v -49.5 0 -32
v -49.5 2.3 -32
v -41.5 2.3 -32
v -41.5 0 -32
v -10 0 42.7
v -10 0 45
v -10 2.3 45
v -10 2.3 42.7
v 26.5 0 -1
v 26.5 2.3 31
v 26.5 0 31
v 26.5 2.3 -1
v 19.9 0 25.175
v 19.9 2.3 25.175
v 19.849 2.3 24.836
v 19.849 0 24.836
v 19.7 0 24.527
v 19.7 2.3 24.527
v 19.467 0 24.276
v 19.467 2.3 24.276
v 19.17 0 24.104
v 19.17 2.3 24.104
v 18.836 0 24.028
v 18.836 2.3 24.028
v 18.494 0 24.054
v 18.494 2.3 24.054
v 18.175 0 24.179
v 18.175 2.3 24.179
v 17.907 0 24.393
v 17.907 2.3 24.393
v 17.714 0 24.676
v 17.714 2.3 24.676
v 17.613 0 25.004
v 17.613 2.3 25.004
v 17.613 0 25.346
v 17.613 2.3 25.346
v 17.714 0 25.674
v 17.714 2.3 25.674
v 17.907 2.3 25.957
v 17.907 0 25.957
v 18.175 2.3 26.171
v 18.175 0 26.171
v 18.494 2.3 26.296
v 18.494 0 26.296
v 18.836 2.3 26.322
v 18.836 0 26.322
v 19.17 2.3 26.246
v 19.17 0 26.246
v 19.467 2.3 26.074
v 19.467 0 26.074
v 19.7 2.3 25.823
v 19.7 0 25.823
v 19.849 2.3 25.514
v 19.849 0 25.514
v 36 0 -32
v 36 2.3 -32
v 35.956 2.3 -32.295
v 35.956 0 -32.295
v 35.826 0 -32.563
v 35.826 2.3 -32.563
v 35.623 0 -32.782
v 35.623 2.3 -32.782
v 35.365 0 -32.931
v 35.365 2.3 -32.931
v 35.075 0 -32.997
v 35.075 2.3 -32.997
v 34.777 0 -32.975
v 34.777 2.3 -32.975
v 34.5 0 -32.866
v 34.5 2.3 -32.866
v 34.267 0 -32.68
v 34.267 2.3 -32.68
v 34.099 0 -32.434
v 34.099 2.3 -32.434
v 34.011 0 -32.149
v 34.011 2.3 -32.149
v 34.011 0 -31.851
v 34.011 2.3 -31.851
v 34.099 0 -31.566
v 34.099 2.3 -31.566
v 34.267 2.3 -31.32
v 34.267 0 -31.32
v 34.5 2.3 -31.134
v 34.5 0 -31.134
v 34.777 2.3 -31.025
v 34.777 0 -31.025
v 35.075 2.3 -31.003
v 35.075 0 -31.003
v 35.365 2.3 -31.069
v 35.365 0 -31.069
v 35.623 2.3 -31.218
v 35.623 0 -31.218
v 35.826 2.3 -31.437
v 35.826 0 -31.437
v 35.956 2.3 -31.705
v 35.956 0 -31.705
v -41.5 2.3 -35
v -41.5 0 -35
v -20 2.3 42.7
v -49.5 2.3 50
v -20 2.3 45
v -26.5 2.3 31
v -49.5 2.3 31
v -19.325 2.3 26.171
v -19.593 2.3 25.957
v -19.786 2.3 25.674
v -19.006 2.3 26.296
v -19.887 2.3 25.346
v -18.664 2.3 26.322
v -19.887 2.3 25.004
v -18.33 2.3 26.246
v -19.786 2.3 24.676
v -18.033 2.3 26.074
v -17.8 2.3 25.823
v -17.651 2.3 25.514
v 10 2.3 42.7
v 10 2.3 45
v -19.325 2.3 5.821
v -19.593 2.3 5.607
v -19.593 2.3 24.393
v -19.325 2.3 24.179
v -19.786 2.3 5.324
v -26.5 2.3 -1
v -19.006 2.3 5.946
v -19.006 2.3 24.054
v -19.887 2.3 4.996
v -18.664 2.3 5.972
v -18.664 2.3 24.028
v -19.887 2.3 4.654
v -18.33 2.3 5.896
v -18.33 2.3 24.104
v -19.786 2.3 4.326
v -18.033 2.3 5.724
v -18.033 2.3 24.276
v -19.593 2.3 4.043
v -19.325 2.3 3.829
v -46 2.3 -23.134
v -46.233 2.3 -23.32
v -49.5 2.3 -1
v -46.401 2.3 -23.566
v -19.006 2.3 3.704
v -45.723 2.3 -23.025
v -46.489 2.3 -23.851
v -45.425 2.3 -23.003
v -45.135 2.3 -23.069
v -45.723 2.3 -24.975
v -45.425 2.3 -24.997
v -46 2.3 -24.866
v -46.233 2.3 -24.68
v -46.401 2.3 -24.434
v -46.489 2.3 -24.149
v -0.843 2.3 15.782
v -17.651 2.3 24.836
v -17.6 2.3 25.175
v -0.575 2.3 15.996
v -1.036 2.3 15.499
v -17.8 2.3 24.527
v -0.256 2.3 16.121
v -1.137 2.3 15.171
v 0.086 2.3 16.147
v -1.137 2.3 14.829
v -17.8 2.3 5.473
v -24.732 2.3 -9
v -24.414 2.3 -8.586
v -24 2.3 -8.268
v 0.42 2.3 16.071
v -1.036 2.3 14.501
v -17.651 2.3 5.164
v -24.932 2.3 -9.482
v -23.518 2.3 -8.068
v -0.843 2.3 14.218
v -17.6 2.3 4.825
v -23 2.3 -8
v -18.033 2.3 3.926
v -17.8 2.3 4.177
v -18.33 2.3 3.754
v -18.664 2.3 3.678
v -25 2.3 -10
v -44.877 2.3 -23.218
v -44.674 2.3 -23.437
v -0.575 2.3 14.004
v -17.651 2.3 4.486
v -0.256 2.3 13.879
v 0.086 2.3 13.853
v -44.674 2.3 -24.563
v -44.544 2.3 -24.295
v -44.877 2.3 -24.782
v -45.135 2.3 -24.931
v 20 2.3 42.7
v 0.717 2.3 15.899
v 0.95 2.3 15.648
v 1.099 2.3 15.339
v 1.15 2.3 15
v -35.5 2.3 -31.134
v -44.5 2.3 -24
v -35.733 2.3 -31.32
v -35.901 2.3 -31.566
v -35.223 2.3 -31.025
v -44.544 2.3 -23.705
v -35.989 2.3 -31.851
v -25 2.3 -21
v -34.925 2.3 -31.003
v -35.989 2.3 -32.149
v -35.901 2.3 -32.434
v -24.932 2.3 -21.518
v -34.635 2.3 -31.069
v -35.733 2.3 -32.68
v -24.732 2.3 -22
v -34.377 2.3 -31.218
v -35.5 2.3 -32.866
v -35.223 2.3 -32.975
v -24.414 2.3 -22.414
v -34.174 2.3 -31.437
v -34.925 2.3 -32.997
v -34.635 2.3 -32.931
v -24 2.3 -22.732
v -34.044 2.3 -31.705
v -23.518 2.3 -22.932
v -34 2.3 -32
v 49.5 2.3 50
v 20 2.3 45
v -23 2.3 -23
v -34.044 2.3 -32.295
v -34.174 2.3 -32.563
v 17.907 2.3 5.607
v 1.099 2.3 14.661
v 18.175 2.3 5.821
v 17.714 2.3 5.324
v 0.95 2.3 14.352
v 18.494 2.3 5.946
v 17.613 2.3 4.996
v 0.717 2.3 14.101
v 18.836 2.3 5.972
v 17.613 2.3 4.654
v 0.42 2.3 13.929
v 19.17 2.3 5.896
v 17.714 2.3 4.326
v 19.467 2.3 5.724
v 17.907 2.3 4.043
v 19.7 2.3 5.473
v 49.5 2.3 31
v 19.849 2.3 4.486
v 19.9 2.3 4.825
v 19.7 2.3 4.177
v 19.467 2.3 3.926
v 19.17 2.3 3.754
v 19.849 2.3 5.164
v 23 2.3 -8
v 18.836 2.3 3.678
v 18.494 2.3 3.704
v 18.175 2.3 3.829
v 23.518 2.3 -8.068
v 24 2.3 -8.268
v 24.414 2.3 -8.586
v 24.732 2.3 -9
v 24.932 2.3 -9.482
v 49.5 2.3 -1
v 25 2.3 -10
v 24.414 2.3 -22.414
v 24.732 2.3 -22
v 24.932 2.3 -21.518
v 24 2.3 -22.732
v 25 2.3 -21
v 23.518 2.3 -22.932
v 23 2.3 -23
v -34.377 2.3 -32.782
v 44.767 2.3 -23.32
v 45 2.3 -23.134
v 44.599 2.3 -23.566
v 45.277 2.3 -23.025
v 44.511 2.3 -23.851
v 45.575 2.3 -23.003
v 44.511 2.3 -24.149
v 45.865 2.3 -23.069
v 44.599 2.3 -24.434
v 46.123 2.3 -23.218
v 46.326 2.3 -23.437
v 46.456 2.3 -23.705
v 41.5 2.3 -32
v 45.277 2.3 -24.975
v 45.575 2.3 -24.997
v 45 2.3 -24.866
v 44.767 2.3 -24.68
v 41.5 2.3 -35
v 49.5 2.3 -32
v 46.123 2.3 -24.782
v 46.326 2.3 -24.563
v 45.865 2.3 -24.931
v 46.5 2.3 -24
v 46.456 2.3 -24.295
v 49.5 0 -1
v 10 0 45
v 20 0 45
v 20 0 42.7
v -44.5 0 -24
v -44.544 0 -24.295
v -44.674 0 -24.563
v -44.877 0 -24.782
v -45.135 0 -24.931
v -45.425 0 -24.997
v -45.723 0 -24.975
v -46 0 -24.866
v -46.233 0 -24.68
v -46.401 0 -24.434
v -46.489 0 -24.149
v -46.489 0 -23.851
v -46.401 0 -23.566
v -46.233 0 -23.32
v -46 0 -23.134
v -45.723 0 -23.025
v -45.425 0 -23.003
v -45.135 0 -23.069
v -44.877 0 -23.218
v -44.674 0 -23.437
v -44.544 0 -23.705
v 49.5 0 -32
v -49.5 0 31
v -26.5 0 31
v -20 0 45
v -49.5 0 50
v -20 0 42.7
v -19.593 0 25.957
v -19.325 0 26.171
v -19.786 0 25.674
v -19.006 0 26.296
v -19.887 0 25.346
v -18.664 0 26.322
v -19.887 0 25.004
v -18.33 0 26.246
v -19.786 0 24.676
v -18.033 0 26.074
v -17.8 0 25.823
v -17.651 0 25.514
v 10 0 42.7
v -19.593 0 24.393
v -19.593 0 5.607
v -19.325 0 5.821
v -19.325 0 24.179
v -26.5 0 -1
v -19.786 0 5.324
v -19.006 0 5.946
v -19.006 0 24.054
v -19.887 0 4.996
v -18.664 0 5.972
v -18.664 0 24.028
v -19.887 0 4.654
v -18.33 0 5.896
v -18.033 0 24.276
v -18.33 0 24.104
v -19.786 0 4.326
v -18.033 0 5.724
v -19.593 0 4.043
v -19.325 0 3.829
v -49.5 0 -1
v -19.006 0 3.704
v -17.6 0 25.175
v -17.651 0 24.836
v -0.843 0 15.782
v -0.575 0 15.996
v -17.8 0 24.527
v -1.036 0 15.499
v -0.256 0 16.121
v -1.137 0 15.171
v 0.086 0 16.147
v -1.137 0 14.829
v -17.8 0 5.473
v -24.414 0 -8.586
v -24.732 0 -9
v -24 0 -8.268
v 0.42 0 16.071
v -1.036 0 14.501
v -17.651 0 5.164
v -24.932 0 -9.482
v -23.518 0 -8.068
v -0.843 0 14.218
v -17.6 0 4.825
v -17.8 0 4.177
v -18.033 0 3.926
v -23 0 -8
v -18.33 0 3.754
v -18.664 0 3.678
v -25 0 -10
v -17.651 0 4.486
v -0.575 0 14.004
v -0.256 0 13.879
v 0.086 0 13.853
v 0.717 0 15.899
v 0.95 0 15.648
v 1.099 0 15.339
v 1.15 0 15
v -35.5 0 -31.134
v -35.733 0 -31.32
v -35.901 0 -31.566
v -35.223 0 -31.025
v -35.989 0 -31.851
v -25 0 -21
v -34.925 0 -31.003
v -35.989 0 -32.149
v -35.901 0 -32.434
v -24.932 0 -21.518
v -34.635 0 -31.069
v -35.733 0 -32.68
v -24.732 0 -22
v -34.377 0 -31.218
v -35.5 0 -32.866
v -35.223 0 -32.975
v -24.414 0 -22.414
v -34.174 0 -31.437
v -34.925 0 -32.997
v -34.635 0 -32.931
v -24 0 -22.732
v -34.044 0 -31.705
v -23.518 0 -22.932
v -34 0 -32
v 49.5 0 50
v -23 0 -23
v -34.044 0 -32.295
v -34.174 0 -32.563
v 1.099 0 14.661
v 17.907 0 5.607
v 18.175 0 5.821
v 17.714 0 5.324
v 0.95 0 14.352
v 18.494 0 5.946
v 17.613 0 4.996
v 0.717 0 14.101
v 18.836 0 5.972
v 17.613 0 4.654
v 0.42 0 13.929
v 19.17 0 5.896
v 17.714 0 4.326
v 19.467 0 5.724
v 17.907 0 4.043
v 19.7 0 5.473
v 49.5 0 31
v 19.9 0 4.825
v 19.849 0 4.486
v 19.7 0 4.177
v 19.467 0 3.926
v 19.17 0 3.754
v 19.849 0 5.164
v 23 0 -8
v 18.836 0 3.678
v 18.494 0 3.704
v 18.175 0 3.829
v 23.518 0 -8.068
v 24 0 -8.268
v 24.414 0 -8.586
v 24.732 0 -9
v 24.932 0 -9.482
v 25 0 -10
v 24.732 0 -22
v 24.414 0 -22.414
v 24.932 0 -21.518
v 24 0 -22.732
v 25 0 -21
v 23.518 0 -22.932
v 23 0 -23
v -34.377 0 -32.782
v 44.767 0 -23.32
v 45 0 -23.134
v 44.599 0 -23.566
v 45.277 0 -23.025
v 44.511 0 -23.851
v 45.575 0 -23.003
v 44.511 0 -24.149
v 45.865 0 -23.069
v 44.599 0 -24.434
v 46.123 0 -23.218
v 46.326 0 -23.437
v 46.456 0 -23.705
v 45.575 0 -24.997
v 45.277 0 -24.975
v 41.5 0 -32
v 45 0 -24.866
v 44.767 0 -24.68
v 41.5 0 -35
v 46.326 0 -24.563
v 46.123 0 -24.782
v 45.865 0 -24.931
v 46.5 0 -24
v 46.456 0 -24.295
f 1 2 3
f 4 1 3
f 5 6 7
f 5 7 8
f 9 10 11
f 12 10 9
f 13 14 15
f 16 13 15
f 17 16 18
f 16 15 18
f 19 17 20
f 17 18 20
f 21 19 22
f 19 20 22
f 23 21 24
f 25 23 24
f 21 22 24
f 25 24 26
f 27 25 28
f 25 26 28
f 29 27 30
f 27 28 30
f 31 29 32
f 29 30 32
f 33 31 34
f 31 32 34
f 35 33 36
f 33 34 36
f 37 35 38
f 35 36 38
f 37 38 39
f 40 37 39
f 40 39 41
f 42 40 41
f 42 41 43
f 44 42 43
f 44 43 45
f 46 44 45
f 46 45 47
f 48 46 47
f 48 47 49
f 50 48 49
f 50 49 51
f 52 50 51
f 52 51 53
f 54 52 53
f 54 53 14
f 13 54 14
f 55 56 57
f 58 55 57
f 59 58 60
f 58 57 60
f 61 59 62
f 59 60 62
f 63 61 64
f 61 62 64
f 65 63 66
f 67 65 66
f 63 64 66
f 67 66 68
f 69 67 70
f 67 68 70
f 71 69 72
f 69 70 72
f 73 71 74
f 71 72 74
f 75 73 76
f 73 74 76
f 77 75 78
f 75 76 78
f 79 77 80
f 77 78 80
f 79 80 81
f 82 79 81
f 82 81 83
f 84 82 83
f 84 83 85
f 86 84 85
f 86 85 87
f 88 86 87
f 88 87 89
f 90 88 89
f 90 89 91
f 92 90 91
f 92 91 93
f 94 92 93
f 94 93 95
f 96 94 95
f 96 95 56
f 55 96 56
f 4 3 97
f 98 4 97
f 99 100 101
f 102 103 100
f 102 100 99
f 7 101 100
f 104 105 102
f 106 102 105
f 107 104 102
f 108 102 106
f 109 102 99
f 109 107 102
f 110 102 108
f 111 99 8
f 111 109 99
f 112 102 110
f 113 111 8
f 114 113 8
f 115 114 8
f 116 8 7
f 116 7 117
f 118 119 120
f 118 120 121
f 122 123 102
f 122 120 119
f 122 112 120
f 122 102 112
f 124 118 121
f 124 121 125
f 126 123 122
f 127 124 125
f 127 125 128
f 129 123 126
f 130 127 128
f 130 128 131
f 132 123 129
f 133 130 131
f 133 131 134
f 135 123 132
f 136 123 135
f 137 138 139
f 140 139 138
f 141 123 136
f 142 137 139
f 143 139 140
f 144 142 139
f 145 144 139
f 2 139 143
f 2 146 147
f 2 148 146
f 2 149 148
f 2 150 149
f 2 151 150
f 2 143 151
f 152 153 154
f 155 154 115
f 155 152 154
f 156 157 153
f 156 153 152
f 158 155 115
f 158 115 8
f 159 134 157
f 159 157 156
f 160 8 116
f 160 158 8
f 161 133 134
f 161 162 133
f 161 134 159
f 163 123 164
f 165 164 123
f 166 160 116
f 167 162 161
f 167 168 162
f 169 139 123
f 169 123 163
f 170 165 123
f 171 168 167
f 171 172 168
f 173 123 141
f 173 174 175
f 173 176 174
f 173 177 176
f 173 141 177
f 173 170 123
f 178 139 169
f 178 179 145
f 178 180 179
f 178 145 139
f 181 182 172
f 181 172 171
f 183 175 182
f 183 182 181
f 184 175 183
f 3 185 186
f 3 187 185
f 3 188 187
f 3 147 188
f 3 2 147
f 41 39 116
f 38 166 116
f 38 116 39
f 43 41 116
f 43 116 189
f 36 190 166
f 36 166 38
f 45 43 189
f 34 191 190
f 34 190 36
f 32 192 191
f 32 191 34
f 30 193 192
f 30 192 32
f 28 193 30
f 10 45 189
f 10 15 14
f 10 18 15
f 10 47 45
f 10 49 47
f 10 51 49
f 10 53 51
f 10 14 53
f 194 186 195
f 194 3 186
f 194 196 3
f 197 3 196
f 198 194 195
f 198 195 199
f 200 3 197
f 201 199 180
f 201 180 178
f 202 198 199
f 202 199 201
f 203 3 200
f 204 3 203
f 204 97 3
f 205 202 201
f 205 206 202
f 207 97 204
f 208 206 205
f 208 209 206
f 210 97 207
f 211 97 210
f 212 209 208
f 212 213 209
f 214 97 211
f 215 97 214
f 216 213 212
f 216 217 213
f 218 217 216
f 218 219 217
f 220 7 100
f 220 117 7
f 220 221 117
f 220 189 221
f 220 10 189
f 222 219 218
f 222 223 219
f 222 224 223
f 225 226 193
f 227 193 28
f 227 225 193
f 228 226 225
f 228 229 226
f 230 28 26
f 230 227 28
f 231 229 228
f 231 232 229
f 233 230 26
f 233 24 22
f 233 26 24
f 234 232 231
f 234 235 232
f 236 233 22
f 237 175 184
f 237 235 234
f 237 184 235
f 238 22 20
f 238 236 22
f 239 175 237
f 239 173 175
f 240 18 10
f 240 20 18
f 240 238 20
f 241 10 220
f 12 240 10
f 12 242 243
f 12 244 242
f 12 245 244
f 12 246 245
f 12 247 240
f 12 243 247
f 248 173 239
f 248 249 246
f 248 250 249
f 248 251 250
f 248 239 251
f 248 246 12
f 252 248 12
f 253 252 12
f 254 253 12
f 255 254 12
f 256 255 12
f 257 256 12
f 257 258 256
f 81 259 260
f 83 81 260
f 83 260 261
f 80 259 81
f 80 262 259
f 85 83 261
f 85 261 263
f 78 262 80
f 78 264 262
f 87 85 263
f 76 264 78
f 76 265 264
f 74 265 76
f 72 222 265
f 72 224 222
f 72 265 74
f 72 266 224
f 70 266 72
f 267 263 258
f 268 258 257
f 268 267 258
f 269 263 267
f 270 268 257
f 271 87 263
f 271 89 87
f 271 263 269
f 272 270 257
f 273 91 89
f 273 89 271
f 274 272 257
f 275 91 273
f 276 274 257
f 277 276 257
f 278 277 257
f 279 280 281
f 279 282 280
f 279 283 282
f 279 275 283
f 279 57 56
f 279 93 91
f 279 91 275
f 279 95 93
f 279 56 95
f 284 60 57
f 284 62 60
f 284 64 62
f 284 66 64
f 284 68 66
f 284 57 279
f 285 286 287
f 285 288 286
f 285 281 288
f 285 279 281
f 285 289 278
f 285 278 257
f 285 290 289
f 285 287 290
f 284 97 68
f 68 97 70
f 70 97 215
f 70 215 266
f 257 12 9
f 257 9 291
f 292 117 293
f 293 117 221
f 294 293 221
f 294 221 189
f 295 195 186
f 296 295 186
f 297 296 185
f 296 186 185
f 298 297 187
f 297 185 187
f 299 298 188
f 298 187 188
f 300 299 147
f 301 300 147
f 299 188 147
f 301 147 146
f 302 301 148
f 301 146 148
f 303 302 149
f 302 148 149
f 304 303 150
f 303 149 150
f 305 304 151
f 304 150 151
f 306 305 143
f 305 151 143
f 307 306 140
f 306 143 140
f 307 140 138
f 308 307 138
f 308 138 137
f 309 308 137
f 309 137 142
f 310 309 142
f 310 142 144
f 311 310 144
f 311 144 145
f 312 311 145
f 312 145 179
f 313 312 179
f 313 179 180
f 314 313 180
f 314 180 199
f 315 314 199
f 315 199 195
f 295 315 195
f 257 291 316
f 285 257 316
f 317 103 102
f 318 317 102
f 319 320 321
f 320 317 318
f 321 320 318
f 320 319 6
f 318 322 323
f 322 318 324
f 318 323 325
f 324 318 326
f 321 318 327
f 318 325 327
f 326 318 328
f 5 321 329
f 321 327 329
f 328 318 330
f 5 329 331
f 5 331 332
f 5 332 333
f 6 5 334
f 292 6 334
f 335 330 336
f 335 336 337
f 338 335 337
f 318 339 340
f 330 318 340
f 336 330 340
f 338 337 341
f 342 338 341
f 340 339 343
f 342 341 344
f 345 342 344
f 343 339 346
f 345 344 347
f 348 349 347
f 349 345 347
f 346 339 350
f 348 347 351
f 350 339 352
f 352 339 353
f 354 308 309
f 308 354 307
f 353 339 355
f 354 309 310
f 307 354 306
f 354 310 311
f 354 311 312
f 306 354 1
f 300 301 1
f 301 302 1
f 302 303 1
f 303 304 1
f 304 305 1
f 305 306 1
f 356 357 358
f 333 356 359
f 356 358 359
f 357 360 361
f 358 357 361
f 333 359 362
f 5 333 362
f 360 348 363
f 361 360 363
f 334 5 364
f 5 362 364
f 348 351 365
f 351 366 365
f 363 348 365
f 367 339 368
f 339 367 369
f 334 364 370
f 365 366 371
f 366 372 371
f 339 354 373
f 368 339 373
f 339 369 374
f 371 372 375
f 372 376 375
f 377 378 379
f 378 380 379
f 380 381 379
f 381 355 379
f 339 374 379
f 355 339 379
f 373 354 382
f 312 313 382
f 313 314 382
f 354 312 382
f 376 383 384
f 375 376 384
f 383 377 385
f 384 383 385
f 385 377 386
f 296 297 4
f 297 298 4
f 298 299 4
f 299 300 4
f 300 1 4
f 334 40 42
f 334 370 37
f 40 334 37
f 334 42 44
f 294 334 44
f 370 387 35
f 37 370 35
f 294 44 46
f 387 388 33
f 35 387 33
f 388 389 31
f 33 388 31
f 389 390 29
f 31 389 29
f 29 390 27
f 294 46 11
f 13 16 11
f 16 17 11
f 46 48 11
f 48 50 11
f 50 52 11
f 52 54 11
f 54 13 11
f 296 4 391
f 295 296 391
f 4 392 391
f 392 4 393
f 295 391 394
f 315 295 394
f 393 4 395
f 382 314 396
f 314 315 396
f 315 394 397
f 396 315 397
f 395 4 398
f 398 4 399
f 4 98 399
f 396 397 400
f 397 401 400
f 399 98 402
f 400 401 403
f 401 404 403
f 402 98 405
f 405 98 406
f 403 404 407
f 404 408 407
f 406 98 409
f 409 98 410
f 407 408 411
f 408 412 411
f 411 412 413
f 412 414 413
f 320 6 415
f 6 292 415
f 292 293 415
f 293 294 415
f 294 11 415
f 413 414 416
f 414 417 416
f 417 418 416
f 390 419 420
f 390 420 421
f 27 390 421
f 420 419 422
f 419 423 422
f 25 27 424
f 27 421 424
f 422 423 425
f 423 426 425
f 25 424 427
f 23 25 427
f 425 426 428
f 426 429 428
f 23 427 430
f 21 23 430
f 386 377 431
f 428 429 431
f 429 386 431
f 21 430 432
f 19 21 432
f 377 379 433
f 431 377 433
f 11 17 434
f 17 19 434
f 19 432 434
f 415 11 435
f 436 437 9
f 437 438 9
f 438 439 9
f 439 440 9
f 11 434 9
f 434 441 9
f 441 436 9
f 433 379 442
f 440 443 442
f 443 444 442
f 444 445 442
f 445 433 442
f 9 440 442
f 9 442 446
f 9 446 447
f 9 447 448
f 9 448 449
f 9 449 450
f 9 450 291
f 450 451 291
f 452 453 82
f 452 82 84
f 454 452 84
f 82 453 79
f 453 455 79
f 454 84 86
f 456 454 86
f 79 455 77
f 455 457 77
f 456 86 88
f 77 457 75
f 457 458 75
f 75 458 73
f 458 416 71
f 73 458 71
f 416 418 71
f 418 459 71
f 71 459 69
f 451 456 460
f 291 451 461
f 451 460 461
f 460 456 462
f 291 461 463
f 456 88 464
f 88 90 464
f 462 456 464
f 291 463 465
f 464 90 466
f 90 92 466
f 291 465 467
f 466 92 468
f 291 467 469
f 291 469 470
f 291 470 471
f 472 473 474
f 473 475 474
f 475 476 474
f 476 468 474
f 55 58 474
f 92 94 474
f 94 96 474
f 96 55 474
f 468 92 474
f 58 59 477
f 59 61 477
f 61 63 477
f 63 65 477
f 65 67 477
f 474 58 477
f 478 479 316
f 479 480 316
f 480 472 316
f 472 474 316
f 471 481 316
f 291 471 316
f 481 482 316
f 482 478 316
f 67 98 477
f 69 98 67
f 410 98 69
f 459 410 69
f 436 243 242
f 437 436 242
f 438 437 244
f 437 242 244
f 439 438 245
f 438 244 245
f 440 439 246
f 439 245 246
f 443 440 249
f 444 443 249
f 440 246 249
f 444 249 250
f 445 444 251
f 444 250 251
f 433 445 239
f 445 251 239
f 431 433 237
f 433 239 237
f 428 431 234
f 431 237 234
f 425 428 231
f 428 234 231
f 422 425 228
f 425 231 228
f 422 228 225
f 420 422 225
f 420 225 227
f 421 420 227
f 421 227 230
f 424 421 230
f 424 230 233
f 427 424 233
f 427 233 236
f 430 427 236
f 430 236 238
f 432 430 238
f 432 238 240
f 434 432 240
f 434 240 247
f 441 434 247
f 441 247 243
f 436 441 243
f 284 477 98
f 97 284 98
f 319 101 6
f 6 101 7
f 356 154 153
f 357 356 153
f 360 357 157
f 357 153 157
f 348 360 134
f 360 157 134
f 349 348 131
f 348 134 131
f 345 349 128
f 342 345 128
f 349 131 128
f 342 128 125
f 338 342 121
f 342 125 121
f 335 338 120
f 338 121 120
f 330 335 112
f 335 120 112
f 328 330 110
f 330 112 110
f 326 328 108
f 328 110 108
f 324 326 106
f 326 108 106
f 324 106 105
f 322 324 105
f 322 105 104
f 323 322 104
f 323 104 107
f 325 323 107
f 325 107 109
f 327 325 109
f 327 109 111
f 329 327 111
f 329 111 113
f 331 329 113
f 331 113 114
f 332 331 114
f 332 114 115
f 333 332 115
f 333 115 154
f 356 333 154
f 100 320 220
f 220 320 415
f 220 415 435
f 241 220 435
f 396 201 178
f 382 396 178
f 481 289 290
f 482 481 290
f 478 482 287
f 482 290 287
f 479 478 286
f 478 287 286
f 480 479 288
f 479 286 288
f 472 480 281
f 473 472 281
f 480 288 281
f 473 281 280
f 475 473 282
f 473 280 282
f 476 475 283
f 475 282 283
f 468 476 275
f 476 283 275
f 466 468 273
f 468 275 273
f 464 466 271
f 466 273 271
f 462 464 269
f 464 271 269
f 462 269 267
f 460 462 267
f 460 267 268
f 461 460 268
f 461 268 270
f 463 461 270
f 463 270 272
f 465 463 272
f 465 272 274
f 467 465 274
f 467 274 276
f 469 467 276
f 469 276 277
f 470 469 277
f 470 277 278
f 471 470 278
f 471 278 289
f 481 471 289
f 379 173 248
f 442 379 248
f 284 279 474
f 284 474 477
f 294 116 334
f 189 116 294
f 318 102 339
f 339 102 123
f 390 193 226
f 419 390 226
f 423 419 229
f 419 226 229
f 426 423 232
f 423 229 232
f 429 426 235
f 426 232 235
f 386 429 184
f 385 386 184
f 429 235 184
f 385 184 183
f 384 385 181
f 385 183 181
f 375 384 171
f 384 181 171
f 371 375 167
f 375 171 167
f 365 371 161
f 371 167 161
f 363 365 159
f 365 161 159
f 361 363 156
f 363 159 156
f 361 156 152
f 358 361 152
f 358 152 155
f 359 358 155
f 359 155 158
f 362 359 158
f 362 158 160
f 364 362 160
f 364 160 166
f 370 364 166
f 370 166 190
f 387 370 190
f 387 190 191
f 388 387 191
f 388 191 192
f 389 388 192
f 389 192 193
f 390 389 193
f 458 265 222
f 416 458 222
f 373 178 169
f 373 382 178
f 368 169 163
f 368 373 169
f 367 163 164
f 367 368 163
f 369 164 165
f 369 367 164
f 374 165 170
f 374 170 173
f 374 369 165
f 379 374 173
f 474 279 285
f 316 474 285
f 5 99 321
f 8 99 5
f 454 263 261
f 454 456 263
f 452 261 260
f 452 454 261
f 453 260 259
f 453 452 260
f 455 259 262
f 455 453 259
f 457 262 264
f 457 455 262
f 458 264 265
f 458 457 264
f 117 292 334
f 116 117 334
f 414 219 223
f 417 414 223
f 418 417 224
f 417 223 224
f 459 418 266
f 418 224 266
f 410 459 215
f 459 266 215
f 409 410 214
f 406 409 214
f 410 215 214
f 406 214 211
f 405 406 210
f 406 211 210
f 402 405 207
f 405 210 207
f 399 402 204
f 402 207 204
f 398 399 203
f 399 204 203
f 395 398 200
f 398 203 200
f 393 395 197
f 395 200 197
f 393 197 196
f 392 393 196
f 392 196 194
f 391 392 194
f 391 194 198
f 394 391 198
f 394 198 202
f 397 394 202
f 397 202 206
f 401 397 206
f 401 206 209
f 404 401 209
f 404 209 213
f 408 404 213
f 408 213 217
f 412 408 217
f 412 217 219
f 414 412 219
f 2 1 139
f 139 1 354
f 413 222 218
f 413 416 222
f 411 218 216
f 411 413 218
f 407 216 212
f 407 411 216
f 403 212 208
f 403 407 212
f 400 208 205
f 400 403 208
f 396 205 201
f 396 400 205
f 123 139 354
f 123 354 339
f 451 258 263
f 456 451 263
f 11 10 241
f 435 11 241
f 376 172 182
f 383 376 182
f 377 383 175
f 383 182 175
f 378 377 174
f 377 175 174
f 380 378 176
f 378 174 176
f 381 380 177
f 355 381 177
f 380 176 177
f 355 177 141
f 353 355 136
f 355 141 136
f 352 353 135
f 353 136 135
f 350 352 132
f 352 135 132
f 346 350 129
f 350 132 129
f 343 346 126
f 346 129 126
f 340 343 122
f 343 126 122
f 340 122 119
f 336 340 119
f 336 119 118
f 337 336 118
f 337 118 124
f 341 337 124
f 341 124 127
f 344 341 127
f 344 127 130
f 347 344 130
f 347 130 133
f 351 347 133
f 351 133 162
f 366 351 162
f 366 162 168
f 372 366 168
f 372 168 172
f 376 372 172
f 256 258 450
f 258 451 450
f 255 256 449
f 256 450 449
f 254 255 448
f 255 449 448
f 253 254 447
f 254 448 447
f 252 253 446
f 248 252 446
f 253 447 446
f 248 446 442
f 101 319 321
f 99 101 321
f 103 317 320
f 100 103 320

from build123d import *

# Parameters (mm, degrees)
BOSS_EXTRUDE1_DEPTH = 2.3
SKETCH3_W           = 8
SKETCH3_H           = 3
SKETCH3_W_2         = 23
SKETCH3_H_2         = 32
CUT_EXTRUDE1_DEPTH  = 3.3
SKETCH4_R           = 1
CUT_EXTRUDE2_DEPTH  = 3.3
SKETCH6_R           = 1.15
CUT_EXTRUDE3_DEPTH  = 3.3
SKETCH8_R           = 1
CUT_EXTRUDE4_DEPTH  = 3.3
SKETCH9_W           = 10
SKETCH9_H           = 2.3
CUT_EXTRUDE5_DEPTH  = 2.3
CUT_EXTRUDE6_DEPTH  = 2.3
FILLET1_R           = 2


with BuildPart() as part:
    # Sketch2 → Boss-Extrude1 (new body)
    with BuildSketch(Plane(origin=(0, 0, 0), x_dir=(1, 0, 0), z_dir=(0, 1, 0))):
        Polygon((0, 35), (-49.5, 35), (-49.5, 0), (-49.5, -50), (0, -50), (49.5, -50), (49.5, 0), (49.5, 35), align=None)
    extrude(amount=BOSS_EXTRUDE1_DEPTH)

    # Sketch3 → Cut-Extrude1 (cut, through all)
    with BuildSketch(Plane(origin=(0, 2.3, 0), x_dir=(1, 0, 0), z_dir=(0, 1, 0))):
        with Locations((-45.5, 33.5)):
            Rectangle(SKETCH3_W, SKETCH3_H)
        with Locations((45.5, 33.5)):
            Rectangle(SKETCH3_W, SKETCH3_H)
        with Locations((38, -15)):
            Rectangle(SKETCH3_W_2, SKETCH3_H_2)
        with Locations((-38, -15)):
            Rectangle(SKETCH3_W_2, SKETCH3_H_2)
    extrude(amount=-CUT_EXTRUDE1_DEPTH, mode=Mode.SUBTRACT)

    # Sketch4 → Cut-Extrude2 (cut, through all)
    with BuildSketch(Plane(origin=(0, 2.3, 0), x_dir=(1, 0, 0), z_dir=(0, 1, 0))):
        with Locations((-45.5, 24)):
            Circle(SKETCH4_R)
        with Locations((45.5, 24)):
            Circle(SKETCH4_R)
    extrude(amount=-CUT_EXTRUDE2_DEPTH, mode=Mode.SUBTRACT)

    # Sketch6 → Cut-Extrude3 (cut, through all)
    with BuildSketch(Plane(origin=(0, 2.3, 0), x_dir=(1, 0, 0), z_dir=(0, 1, 0))):
        with Locations((0, -15)):
            Circle(SKETCH6_R)
        with Locations((-18.75, -4.825)):
            Circle(SKETCH6_R)
        with Locations((-18.75, -25.175)):
            Circle(SKETCH6_R)
        with Locations((18.75, -4.825)):
            Circle(SKETCH6_R)
        with Locations((18.75, -25.175)):
            Circle(SKETCH6_R)
    extrude(amount=-CUT_EXTRUDE3_DEPTH, mode=Mode.SUBTRACT)

    # Sketch8 → Cut-Extrude4 (cut, through all)
    with BuildSketch(Plane(origin=(0, 2.3, 0), x_dir=(1, 0, 0), z_dir=(0, 1, 0))):
        with Locations((-35, 32)):
            Circle(SKETCH8_R)
        with Locations((35, 32)):
            Circle(SKETCH8_R)
    extrude(amount=-CUT_EXTRUDE4_DEPTH, mode=Mode.SUBTRACT)

    # Sketch9 → Cut-Extrude5 (cut)
    with BuildSketch(Plane(origin=(0, 2.3, 0), x_dir=(1, 0, 0), z_dir=(0, 1, 0))):
        with Locations((-15, -43.85)):
            Rectangle(SKETCH9_W, SKETCH9_H)
        with Locations((15, -43.85)):
            Rectangle(SKETCH9_W, SKETCH9_H)
    extrude(amount=-CUT_EXTRUDE5_DEPTH, mode=Mode.SUBTRACT)

    # Sketch10 → Cut-Extrude6 (cut)
    with BuildSketch(Plane(origin=(0, 2.3, 0), x_dir=(1, 0, 0), z_dir=(0, 1, 0))):
        Polygon((0, 8), (25, 8), (25, 23), (-25, 23), (-25, 8), align=None)
    extrude(amount=-CUT_EXTRUDE6_DEPTH, mode=Mode.SUBTRACT)

    # Fillet1
    fillet1_edges = [part.edges().sort_by_distance(p)[0] for p in [
        (-25, 1.15, -8),
        (-25, 1.15, -23),
        (25, 1.15, -23),
        (25, 1.15, -8),
    ]]
    fillet(fillet1_edges, radius=FILLET1_R)


solid = part.part
